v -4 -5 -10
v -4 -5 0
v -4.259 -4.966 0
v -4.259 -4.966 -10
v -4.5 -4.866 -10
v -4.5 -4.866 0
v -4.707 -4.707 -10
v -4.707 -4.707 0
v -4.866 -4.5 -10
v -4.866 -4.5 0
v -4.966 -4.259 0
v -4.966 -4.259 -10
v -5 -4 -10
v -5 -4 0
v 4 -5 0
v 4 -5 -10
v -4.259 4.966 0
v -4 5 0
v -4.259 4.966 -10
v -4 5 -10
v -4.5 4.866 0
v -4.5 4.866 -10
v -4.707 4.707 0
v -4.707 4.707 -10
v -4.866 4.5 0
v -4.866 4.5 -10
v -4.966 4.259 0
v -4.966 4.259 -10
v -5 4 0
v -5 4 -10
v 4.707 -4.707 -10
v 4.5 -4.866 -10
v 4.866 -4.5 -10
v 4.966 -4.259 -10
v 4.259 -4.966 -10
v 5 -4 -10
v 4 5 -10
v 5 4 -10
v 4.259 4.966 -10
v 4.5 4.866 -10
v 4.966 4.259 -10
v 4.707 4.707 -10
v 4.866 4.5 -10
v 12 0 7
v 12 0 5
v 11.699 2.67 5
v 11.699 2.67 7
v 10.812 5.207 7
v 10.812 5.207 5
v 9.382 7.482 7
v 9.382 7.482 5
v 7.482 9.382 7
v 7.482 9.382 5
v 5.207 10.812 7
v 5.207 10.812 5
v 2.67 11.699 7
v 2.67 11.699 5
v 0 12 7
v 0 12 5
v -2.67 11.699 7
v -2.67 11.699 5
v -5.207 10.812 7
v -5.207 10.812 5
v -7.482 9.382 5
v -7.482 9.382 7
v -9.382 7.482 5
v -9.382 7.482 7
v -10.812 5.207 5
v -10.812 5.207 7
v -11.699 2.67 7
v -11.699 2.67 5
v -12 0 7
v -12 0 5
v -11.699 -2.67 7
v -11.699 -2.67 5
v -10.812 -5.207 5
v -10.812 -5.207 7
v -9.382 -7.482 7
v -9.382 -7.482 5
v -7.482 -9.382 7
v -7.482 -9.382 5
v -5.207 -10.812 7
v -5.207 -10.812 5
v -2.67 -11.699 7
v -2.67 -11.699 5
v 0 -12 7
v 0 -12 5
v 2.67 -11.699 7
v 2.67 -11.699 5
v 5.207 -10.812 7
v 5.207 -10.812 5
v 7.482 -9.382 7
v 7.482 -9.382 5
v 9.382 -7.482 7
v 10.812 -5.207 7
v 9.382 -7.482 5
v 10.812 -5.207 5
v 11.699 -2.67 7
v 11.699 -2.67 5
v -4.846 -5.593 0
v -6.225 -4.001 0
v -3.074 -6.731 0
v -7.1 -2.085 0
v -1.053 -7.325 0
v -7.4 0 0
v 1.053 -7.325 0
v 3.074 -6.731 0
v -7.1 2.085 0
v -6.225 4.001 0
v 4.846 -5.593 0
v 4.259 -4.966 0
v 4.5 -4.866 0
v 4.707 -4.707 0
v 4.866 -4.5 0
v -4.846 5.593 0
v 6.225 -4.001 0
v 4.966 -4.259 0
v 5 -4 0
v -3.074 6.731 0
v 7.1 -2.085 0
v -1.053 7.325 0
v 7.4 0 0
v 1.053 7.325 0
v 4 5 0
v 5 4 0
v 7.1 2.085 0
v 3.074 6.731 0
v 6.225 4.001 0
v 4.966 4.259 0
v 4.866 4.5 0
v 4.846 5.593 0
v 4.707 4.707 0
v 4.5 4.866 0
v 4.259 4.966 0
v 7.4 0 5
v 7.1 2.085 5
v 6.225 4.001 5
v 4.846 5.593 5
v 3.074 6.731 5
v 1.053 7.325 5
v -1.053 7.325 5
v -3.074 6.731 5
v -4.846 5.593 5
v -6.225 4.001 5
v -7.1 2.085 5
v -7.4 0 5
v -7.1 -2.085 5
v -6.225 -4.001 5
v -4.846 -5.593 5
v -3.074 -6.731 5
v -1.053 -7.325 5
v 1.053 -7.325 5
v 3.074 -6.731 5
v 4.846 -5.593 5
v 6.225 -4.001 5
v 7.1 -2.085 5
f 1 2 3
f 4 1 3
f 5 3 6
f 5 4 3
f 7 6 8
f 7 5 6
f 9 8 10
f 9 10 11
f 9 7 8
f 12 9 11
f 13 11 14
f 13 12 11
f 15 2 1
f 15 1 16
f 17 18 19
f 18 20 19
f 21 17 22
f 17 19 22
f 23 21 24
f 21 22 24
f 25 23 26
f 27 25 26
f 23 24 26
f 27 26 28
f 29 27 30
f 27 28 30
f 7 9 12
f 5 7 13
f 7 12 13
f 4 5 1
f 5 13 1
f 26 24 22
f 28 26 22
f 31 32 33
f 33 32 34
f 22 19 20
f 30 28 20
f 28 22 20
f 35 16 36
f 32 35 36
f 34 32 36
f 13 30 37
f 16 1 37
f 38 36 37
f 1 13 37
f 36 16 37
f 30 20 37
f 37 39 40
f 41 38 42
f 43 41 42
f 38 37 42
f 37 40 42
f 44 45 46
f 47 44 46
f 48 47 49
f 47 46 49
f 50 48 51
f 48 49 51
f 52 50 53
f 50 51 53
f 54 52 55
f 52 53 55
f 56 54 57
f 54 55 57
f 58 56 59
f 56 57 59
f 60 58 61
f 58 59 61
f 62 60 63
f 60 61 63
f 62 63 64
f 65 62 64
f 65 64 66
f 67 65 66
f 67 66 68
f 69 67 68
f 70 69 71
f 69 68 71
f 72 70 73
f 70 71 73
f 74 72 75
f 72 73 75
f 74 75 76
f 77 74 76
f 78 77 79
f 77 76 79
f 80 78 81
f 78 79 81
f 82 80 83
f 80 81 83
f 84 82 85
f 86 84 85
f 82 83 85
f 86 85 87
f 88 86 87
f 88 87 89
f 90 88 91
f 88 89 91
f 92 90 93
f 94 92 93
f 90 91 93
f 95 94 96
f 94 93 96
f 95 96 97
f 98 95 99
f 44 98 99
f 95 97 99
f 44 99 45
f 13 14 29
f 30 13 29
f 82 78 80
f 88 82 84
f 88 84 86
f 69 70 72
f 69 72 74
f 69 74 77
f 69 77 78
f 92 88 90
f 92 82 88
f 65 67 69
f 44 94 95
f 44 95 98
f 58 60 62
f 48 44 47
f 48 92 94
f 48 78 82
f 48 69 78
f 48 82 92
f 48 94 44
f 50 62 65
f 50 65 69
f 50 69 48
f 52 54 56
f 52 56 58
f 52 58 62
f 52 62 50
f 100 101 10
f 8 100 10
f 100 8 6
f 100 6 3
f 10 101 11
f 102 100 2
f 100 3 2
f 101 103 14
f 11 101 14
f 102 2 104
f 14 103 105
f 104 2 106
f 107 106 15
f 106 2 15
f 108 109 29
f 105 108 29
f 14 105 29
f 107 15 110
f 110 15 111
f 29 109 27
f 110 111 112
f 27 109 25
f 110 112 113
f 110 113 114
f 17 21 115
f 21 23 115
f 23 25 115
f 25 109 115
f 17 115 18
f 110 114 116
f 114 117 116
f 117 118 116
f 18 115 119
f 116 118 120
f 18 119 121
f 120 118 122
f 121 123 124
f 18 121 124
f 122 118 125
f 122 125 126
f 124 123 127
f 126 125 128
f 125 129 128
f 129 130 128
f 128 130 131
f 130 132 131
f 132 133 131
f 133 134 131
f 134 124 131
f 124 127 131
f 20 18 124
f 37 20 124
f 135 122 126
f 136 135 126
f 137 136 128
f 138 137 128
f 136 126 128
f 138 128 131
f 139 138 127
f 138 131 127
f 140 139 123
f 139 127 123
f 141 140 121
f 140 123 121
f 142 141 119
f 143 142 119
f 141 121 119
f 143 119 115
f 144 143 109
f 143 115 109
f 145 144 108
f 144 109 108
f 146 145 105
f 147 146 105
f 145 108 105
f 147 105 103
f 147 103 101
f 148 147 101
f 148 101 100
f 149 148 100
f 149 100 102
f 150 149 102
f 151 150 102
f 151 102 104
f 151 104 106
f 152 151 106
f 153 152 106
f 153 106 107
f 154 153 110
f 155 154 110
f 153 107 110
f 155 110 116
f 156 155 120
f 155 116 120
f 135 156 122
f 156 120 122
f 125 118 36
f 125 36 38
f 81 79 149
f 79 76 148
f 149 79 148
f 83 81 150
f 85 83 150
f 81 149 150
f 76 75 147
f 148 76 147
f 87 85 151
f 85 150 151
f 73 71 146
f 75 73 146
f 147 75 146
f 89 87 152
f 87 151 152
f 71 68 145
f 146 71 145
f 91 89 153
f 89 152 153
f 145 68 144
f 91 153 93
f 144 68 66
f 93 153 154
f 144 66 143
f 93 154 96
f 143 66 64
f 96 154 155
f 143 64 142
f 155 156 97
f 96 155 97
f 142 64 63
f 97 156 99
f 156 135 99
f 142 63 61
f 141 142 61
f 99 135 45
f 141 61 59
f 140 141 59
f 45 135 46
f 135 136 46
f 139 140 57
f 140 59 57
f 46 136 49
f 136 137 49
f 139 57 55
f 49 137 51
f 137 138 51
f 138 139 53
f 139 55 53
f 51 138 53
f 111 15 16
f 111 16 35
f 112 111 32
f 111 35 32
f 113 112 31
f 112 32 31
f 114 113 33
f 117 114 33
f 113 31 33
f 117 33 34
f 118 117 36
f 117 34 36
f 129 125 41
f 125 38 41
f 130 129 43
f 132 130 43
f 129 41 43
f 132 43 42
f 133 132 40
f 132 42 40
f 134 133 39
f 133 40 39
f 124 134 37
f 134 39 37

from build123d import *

# Parameters (mm, degrees)
SKETCH1_W           = 10
SKETCH1_H           = 10
BOSS_EXTRUDE1_DEPTH = 10
SKETCH1_4_R         = 7.4
BOSS_EXTRUDE2_DEPTH = 5
FILLET1_R           = 1
BOSS_EXTRUDE3_START = 5
SKETCH2_R           = 12
BOSS_EXTRUDE3_DEPTH = 2


with BuildPart() as part:
    # Sketch1 → Boss-Extrude1 (new body)
    with BuildSketch(Plane.XY):
        Rectangle(SKETCH1_W, SKETCH1_H)
    extrude(amount=-BOSS_EXTRUDE1_DEPTH)

    # Sketch1<4> → Boss-Extrude2 (add)
    with BuildSketch(Plane.XY):
        Circle(SKETCH1_4_R)
    extrude(amount=BOSS_EXTRUDE2_DEPTH)

    # Fillet1
    fillet1_edges = [part.edges().sort_by_distance(p)[0] for p in [
        (-5, -5, -5),
        (-5, 5, -5),
        (5, 5, -5),
        (5, -5, -5),
    ]]
    fillet(fillet1_edges, radius=FILLET1_R)

    # Sketch2 → Boss-Extrude3 (add)
    with BuildSketch(Plane.XY.offset(BOSS_EXTRUDE3_START)):
        Circle(SKETCH2_R)
    extrude(amount=BOSS_EXTRUDE3_DEPTH)


solid = part.part
